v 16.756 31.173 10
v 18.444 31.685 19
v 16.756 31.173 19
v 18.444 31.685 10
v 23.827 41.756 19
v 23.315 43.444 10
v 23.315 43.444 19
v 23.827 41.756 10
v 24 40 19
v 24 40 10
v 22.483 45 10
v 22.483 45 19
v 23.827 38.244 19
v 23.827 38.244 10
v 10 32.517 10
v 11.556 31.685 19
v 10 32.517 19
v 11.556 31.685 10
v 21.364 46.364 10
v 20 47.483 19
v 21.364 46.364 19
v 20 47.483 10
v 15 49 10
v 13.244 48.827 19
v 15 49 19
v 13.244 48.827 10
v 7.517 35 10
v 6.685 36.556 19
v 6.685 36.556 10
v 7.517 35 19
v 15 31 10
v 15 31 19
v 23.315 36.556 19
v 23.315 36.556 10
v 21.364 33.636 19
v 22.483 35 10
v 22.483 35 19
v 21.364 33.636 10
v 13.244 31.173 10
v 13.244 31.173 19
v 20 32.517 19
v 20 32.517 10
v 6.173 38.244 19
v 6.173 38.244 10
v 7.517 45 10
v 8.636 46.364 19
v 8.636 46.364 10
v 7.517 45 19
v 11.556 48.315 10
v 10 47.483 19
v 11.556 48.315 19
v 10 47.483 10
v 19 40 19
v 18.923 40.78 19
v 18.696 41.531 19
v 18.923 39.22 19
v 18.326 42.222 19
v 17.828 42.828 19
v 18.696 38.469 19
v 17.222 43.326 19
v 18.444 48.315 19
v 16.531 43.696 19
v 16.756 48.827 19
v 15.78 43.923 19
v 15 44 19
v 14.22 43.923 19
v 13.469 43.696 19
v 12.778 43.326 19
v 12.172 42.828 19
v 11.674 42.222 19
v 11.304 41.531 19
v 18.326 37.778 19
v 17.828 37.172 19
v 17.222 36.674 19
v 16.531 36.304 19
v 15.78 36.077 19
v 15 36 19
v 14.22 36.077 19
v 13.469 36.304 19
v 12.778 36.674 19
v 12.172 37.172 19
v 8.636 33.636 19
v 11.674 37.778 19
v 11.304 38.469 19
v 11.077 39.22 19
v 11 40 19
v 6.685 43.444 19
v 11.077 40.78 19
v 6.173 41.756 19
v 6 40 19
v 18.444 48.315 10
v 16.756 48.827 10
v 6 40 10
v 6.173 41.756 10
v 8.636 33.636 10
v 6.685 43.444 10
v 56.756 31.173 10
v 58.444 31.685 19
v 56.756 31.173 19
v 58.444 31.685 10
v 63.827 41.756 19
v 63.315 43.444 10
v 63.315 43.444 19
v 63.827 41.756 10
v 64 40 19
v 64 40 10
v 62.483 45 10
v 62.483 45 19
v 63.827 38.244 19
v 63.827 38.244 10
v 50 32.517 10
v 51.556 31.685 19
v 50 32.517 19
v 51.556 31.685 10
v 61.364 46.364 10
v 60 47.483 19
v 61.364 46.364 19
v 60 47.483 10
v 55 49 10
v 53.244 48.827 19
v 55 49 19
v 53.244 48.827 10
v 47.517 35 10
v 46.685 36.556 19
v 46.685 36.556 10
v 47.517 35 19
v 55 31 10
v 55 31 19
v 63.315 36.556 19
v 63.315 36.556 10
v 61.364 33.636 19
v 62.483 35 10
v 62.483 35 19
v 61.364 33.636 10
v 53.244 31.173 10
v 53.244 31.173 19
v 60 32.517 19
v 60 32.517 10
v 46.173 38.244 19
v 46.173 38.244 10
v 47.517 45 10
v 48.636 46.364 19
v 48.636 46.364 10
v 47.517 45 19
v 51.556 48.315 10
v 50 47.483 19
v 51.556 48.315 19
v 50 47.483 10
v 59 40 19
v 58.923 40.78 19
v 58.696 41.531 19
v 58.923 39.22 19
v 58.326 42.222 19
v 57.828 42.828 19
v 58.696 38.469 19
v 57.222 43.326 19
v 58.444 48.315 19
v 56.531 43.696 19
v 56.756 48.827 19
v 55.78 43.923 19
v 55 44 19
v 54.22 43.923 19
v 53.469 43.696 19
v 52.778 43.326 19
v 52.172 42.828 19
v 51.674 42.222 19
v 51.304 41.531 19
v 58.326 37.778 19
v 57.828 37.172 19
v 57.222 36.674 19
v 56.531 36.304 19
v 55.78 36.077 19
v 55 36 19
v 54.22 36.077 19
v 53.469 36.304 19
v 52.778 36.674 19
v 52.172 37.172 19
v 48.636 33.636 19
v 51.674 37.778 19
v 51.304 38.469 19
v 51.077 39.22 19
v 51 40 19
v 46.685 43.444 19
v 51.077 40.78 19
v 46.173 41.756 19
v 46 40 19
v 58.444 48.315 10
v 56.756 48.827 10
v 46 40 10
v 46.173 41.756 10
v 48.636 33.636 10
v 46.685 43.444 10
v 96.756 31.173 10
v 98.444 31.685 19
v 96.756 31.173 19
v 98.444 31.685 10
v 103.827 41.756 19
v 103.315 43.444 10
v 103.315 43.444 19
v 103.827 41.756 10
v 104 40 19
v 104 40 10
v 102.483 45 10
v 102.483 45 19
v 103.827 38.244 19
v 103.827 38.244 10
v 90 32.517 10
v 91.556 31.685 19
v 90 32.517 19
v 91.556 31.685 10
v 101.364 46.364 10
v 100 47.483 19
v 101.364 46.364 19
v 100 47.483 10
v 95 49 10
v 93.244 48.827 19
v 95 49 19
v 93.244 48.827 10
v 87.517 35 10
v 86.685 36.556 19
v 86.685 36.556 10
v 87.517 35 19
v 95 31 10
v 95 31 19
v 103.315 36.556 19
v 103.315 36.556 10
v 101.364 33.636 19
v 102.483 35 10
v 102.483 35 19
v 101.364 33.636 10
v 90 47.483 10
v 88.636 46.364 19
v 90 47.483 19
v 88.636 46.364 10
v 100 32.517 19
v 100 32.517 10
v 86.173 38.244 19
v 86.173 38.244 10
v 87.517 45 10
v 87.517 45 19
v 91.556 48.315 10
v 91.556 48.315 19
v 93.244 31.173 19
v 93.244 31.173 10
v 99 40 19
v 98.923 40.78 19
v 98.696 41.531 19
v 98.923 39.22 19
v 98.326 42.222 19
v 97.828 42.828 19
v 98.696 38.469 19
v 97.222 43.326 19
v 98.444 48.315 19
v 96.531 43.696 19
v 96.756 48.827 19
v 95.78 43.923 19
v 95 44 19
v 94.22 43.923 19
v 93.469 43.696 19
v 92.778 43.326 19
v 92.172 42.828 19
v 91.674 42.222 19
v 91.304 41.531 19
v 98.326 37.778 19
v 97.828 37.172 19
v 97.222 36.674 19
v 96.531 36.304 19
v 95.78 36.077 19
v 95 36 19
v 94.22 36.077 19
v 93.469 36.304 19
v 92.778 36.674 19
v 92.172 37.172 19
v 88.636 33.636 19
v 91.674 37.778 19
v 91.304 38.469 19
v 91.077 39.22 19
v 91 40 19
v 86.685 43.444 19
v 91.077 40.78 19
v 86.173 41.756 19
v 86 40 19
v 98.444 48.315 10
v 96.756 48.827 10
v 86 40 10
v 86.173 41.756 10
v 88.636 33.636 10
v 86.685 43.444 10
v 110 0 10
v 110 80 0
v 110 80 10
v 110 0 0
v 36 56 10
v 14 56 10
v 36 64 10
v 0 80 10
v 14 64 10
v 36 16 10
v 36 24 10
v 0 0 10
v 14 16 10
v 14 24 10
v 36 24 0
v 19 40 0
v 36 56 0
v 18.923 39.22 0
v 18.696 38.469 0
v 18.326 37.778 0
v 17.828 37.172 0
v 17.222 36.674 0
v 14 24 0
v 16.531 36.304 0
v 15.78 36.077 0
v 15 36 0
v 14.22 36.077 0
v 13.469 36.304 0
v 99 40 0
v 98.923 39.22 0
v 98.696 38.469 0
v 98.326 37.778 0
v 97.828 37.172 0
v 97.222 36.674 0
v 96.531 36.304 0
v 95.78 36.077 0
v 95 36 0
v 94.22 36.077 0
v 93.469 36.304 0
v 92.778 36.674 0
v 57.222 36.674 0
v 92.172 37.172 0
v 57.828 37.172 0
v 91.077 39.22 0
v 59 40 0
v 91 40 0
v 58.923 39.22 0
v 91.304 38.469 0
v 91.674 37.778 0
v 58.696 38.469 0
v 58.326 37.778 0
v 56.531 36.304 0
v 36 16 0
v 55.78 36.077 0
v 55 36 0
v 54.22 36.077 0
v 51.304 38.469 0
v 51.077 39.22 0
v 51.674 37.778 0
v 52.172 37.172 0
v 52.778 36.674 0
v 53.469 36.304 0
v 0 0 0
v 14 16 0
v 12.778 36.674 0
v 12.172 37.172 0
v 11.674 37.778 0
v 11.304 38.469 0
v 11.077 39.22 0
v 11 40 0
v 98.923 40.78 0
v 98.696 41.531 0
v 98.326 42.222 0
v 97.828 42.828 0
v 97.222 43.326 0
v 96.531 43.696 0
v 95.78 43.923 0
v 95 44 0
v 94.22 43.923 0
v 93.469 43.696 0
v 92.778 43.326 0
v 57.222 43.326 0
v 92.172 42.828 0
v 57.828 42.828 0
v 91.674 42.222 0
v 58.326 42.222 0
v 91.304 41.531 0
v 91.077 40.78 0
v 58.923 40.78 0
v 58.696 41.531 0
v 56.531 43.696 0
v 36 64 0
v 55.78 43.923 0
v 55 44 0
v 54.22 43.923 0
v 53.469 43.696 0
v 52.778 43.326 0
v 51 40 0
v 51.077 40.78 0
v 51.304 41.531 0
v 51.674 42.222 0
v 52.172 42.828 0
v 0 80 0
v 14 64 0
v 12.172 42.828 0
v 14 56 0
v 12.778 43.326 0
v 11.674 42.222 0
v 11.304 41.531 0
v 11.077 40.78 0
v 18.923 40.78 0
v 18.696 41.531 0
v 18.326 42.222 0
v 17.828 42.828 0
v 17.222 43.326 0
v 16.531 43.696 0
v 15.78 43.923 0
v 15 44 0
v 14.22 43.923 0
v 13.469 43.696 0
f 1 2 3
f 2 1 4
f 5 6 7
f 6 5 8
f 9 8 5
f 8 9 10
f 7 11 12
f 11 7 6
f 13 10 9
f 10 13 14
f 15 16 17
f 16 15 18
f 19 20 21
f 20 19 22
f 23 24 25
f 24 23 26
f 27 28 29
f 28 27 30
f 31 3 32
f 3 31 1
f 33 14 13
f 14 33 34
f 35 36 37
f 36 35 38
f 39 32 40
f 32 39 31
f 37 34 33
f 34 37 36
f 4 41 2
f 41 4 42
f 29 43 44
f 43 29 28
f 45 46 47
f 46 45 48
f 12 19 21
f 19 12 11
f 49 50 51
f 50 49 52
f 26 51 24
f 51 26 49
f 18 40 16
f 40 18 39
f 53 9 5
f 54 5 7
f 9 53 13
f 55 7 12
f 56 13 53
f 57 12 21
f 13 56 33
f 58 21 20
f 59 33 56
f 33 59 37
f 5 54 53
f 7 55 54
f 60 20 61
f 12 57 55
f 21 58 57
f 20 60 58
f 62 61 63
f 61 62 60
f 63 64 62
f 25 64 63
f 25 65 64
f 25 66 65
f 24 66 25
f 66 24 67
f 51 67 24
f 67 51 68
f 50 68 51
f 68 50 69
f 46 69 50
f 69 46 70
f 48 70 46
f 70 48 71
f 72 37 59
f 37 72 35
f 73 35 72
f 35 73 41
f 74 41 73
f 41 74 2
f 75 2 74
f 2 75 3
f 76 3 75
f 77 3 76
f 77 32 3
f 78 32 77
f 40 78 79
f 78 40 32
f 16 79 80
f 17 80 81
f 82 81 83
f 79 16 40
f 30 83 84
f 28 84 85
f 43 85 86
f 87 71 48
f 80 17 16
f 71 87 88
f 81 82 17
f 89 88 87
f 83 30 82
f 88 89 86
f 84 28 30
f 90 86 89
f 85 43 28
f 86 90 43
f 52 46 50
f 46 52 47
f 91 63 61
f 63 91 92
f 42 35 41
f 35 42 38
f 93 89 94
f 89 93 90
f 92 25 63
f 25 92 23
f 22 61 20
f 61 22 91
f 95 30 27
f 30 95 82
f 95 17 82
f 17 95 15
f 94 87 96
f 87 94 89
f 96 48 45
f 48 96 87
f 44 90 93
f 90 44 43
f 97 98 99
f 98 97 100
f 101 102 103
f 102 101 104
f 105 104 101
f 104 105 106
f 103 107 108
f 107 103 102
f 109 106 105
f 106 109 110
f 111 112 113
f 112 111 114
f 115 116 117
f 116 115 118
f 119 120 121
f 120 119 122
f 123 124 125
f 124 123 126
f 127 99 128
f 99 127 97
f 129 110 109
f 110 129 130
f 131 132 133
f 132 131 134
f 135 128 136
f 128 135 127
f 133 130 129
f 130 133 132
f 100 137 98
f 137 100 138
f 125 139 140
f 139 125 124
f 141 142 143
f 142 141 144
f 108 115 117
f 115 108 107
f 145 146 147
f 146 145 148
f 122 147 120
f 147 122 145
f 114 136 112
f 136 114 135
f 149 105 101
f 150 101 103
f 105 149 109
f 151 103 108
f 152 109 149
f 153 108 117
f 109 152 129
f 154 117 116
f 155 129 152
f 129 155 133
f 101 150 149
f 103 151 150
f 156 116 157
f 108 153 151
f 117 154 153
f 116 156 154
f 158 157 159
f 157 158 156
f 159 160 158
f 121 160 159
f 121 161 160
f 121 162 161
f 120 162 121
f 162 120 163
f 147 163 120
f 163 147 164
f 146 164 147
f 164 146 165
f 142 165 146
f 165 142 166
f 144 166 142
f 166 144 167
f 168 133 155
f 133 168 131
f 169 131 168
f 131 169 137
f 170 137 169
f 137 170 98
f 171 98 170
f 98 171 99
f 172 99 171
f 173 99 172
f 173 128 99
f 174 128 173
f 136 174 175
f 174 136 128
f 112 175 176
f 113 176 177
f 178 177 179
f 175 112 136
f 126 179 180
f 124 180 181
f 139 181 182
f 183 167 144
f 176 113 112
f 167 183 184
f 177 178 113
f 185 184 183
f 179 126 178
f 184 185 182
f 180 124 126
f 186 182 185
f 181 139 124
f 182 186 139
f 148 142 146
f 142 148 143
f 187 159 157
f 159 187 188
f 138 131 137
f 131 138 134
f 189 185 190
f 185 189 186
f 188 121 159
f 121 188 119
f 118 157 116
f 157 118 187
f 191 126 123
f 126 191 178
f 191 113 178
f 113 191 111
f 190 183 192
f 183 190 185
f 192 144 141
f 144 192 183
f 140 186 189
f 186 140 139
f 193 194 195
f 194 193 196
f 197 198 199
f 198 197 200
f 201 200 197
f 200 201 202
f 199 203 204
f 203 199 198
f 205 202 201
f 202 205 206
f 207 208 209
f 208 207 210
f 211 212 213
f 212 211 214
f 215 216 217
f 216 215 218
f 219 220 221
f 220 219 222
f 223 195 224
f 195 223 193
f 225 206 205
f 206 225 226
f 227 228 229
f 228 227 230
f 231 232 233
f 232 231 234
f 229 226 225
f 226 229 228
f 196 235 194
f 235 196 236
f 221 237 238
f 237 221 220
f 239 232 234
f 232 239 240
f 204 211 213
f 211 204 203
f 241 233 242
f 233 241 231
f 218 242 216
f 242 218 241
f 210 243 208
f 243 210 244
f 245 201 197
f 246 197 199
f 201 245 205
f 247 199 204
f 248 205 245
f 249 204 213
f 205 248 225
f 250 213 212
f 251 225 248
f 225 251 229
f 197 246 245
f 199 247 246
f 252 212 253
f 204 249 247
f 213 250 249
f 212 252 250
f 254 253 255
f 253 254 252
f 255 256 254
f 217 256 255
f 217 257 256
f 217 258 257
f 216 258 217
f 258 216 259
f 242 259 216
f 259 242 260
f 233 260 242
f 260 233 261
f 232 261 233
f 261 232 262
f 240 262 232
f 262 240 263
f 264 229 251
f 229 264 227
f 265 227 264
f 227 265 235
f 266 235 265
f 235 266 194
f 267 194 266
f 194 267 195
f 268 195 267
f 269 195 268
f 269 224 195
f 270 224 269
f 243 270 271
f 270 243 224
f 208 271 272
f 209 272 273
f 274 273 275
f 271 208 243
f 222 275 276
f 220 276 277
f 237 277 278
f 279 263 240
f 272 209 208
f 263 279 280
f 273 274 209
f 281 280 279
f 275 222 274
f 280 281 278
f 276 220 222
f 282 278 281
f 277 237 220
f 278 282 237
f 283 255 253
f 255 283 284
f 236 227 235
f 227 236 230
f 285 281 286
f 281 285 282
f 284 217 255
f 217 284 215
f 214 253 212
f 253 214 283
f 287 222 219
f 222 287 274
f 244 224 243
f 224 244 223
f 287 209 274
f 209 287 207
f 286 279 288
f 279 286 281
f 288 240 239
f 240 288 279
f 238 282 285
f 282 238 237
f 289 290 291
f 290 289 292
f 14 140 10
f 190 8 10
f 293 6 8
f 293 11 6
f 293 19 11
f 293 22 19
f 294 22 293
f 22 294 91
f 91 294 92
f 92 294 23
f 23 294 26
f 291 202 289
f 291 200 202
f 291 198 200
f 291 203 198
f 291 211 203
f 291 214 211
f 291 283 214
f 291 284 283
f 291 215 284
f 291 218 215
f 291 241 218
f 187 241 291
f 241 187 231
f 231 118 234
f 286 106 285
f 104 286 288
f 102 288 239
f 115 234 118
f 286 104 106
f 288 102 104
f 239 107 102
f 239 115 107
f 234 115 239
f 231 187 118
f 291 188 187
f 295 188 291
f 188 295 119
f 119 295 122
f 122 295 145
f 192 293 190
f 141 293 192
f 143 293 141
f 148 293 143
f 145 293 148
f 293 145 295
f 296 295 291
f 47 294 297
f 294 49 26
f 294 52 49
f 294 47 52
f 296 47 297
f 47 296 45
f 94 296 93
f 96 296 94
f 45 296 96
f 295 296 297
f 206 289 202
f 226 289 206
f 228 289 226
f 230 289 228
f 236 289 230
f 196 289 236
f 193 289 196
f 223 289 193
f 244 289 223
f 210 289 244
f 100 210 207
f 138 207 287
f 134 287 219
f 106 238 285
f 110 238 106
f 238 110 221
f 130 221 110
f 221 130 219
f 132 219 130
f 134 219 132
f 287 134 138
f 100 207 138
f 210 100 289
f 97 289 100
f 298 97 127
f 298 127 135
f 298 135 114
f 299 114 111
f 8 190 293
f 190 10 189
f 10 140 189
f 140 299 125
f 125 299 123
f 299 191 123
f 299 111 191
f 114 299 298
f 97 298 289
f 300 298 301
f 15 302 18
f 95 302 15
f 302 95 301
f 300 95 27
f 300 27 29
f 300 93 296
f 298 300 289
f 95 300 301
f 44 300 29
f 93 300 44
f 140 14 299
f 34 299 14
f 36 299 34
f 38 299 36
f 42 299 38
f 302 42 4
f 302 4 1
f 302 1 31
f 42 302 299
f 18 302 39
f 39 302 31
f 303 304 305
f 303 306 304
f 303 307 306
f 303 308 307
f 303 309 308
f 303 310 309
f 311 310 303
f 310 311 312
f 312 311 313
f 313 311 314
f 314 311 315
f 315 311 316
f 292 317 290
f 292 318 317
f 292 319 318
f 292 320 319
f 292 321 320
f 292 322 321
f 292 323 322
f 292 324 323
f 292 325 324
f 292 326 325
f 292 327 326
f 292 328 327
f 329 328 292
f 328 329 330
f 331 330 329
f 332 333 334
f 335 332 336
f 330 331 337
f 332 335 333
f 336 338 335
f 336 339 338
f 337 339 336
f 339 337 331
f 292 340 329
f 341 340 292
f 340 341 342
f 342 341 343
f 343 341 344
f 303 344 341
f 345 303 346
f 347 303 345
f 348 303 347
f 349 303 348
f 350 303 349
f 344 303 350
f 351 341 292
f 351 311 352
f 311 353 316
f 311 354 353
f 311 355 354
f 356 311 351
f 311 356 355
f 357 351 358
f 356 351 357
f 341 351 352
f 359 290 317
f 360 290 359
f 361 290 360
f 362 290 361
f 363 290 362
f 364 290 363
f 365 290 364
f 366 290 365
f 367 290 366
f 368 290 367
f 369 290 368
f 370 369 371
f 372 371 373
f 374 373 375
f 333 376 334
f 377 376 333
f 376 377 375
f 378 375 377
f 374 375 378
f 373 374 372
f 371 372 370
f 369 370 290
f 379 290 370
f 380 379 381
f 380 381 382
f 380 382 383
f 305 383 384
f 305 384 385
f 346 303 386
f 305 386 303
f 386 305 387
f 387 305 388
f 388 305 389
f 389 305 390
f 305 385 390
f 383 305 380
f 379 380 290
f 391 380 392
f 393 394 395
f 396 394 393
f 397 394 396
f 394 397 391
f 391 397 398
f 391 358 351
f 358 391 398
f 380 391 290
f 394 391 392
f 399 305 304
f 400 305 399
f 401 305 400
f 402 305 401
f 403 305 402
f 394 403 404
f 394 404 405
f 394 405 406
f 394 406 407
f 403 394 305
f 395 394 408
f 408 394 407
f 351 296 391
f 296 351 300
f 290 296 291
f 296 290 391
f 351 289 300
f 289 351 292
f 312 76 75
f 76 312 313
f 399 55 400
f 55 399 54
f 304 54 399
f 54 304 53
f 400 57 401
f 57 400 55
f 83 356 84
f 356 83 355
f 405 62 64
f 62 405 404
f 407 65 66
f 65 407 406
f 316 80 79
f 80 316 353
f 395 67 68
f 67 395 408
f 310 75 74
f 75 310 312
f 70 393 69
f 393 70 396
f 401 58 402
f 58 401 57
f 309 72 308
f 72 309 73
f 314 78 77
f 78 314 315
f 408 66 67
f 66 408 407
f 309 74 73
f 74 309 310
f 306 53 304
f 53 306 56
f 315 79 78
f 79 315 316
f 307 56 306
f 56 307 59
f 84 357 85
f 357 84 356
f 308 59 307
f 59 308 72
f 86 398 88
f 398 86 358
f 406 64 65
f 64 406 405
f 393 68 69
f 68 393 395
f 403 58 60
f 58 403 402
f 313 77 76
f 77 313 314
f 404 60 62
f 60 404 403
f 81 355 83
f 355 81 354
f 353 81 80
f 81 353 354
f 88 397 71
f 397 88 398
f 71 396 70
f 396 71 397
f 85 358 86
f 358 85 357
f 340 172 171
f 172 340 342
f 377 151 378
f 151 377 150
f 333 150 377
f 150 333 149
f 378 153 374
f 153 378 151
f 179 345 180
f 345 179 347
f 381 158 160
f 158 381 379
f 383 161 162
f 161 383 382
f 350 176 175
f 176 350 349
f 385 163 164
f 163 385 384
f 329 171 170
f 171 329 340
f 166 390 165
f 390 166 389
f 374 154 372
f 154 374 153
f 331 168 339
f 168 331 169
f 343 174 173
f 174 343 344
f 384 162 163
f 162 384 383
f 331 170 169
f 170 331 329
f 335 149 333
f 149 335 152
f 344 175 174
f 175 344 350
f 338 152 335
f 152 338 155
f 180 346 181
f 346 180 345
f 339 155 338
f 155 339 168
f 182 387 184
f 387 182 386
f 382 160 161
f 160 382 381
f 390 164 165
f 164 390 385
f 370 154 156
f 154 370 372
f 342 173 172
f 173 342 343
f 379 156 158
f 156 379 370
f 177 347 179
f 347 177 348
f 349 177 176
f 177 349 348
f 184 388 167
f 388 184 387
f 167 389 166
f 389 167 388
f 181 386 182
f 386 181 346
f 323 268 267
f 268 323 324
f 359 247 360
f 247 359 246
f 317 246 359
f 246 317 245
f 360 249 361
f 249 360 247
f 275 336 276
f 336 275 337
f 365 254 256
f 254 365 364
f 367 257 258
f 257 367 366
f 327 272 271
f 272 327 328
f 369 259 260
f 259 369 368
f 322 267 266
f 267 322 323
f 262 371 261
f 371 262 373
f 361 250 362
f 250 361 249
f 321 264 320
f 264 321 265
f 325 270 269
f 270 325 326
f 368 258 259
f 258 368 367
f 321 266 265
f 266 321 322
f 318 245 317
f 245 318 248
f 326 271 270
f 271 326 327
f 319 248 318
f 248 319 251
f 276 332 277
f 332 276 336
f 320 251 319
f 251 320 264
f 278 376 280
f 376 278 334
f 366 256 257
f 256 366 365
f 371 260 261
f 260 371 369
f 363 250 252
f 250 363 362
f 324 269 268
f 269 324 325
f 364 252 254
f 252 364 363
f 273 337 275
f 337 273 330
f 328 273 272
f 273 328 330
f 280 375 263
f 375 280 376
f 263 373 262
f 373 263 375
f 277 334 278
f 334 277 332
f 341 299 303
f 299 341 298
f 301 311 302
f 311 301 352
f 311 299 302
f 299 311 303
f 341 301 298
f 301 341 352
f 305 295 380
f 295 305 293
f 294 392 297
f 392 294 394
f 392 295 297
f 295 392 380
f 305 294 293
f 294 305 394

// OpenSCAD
$fn = 32;

// ----------------------------------------------------------------------
// Drill jig: three_boss_slot jig
// ----------------------------------------------------------------------

// --- parameters (mm) ---
plate_l = 110;            // plate length, X
plate_w = 80;             // plate width, Y
plate_t = 10;             // plate thickness
boss_d = 18;              // guide boss diameter
boss_h = 10;              // boss height above the plate
guide_d = 8;              // guide hole diameter
boss_pitch = 40;          // boss pitch
slot_w = 8;               // clamp slot width
slot_l = 22;              // clamp slot length
slot_x = 14;              // slot start X
fit_tol = 0.05;           // tolerance for press fits, mm
free_tol = 0.2;           // tolerance for clearance fits, mm

n_boss = 3;  // guide bosses
boss_x0 = (plate_l - (n_boss - 1) * boss_pitch) / 2;  // first boss X
boss_top = plate_t - 1 + boss_h;  // boss crown height
total_h = boss_top;  // overall height

difference() {
  union() {
  cube([plate_l, plate_w, plate_t]);
  for (i = [0 : n_boss - 1])
    translate([boss_x0 + i * boss_pitch, plate_w / 2, plate_t - 1])
      cylinder(h = boss_h, d = boss_d);
  }
  for (i = [0 : n_boss - 1])
    translate([boss_x0 + i * boss_pitch, plate_w / 2, -1])
      cylinder(h = plate_t + boss_h, d = guide_d);
  for (cy = [plate_w * 0.25, plate_w * 0.75])
    translate([slot_x, cy - slot_w / 2, -1])
      cube([slot_l, slot_w, plate_t + 2]);
}
